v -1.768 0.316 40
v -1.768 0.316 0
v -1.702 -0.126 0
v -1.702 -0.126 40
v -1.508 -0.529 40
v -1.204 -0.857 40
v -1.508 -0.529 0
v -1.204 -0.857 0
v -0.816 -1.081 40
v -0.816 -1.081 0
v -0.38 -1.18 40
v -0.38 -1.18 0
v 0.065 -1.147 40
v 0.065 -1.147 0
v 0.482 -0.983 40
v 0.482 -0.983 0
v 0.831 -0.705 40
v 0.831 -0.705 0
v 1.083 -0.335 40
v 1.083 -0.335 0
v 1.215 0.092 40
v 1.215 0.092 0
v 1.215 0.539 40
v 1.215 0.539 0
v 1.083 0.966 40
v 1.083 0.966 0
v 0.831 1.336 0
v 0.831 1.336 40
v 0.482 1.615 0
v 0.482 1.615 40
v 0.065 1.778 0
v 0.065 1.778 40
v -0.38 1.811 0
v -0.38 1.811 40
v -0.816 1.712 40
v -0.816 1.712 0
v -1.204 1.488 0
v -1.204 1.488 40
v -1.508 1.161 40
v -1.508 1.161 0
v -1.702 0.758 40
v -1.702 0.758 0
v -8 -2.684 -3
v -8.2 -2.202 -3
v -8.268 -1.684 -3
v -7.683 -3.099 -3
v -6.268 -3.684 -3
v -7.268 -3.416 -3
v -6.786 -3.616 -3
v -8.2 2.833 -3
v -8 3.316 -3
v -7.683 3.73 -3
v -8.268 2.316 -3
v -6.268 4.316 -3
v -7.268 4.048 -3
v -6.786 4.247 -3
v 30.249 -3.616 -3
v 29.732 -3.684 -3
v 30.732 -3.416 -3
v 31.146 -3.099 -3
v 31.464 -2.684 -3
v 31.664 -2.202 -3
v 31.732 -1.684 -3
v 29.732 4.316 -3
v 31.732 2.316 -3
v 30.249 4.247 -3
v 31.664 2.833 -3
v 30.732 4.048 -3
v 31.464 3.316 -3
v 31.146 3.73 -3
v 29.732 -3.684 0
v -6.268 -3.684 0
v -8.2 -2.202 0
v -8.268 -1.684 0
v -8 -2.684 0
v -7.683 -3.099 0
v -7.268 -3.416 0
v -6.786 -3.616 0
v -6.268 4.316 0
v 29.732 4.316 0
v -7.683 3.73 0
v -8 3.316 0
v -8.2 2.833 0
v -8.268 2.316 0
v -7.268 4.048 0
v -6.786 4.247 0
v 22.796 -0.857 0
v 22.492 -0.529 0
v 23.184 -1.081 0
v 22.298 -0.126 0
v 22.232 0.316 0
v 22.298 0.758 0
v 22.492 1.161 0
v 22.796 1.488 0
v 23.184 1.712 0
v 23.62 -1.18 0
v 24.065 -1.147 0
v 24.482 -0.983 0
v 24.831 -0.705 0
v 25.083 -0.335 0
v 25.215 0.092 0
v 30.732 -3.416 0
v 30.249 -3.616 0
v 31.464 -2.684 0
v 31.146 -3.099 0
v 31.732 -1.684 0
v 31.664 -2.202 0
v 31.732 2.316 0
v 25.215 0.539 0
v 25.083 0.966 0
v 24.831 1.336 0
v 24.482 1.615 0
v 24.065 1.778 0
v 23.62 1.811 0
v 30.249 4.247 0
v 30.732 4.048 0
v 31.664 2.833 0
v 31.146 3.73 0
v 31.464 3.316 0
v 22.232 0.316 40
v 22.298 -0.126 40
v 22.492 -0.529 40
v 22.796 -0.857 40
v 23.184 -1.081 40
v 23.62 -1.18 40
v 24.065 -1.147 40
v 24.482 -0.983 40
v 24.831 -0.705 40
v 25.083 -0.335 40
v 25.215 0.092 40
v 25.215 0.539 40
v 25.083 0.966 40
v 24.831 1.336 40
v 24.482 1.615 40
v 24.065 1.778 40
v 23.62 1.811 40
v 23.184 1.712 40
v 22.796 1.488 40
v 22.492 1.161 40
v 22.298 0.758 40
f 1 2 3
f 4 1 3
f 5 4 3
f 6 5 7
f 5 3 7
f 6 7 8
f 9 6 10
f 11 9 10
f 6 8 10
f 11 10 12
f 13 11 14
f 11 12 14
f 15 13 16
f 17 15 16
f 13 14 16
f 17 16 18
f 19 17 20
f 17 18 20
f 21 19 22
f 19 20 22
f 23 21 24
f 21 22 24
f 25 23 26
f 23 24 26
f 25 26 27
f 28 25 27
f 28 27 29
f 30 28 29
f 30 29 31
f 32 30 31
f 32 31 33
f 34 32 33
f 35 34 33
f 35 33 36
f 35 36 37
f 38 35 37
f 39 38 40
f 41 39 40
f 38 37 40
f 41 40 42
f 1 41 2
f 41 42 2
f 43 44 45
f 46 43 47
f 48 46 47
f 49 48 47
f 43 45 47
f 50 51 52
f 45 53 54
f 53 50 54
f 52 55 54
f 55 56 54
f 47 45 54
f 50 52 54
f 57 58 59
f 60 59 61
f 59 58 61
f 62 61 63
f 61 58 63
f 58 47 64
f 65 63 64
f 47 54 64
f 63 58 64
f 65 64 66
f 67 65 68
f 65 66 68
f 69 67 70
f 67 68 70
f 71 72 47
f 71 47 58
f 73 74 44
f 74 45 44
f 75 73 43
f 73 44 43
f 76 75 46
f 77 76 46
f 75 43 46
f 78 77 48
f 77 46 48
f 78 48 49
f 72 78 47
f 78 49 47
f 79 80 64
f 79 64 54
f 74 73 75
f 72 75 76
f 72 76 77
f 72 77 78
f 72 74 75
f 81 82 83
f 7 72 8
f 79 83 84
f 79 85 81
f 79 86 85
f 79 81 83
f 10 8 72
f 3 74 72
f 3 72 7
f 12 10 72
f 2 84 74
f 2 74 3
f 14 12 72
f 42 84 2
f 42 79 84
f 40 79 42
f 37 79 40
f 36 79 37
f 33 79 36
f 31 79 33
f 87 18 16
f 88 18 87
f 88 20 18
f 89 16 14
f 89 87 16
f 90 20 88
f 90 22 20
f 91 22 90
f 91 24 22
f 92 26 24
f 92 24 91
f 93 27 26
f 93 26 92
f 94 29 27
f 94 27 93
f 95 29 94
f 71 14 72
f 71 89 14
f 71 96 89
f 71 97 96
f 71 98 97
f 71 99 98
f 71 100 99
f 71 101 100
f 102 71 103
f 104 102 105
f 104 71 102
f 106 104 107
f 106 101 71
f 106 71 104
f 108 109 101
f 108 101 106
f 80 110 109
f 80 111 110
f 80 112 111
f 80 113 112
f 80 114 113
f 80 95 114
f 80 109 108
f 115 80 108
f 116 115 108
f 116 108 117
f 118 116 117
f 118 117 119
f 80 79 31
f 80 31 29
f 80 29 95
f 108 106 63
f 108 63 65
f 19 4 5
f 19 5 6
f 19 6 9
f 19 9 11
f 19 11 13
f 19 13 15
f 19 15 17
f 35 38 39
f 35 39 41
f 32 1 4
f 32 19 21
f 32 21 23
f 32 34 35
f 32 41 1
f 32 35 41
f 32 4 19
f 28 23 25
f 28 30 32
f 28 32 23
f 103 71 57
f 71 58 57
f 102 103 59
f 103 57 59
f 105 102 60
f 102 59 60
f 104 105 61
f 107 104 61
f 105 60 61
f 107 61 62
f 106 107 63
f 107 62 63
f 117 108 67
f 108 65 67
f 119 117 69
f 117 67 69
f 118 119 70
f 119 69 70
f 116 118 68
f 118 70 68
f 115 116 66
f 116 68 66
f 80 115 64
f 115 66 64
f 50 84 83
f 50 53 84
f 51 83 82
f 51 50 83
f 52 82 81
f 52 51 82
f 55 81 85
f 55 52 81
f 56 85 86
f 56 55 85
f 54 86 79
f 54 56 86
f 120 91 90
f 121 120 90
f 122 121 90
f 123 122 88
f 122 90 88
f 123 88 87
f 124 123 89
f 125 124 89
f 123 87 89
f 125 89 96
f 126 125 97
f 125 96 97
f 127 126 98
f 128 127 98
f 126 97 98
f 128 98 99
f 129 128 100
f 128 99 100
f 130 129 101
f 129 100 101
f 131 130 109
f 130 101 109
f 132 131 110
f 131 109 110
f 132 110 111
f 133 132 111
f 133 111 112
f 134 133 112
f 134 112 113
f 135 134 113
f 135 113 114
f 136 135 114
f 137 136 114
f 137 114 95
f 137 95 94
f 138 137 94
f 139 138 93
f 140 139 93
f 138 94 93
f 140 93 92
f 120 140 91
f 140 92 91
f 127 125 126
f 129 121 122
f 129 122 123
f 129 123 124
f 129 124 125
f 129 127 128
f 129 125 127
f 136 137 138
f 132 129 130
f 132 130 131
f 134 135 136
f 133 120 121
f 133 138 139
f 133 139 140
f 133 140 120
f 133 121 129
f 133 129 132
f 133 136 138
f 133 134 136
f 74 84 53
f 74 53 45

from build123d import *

# Parameters (mm, degrees)
F1_DEPTH = 3
F2_R     = 2
F3_DEPTH = 40


with BuildPart() as f1:
    # F0 (on Top) → F1 (new body)
    with BuildSketch(Plane.XY):
        with BuildLine():
            Line((11.7317076979, 4.315632835), (-8.2682923021, 4.315632835))
            Line((-8.2682923021, 4.315632835), (-8.2682923021, 0.315632835))
            Line((-8.2682923021, 0.315632835), (-1.7682923021, 0.315632835))
            ThreePointArc((-1.7682923021, 0.315632835), (-0.2682923021, 1.815632835), (1.2317076979, 0.315632835))
            Line((1.2317076979, 0.315632835), (11.7317076979, 0.315632835))
            Line((11.7317076979, 0.315632835), (11.7317076979, 4.315632835))
        make_face()
        with BuildLine():
            Line((31.7317076979, 4.315632835), (11.7317076979, 4.315632835))
            Line((11.7317076979, 4.315632835), (11.7317076979, 0.315632835))
            Line((11.7317076979, 0.315632835), (22.2317076979, 0.315632835))
            ThreePointArc((22.2317076979, 0.315632835), (23.7317076979, 1.815632835), (25.2317076979, 0.315632835))
            Line((25.2317076979, 0.315632835), (31.7317076979, 0.315632835))
            Line((31.7317076979, 0.315632835), (31.7317076979, 4.315632835))
        make_face()
        with BuildLine():
            Line((-1.7682923021, 0.315632835), (-8.2682923021, 0.315632835))
            Line((-8.2682923021, 0.315632835), (-8.2682923021, -3.684367165))
            Line((-8.2682923021, -3.684367165), (11.7317076979, -3.684367165))
            Line((11.7317076979, -3.684367165), (11.7317076979, 0.315632835))
            Line((11.7317076979, 0.315632835), (1.2317076979, 0.315632835))
            ThreePointArc((1.2317076979, 0.315632835), (-0.2682923021, -1.184367165), (-1.7682923021, 0.315632835))
        make_face()
        with BuildLine():
            Line((22.2317076979, 0.315632835), (11.7317076979, 0.315632835))
            Line((11.7317076979, 0.315632835), (11.7317076979, -3.684367165))
            Line((11.7317076979, -3.684367165), (31.7317076979, -3.684367165))
            Line((31.7317076979, -3.684367165), (31.7317076979, 0.315632835))
            Line((31.7317076979, 0.315632835), (25.2317076979, 0.315632835))
            ThreePointArc((25.2317076979, 0.315632835), (23.7317076979, -1.184367165), (22.2317076979, 0.315632835))
        make_face()
        with BuildLine():
            Line((1.2317076979, 0.315632835), (-1.7682923021, 0.315632835))
            ThreePointArc((-1.7682923021, 0.315632835), (-0.2682923021, -1.184367165), (1.2317076979, 0.315632835))
        make_face()
        with BuildLine():
            ThreePointArc((1.2317076979, 0.315632835), (-0.2682923021, 1.815632835), (-1.7682923021, 0.315632835))
            Line((-1.7682923021, 0.315632835), (1.2317076979, 0.315632835))
        make_face()
        with BuildLine():
            ThreePointArc((25.2317076979, 0.315632835), (23.7317076979, 1.815632835), (22.2317076979, 0.315632835))
            Line((22.2317076979, 0.315632835), (25.2317076979, 0.315632835))
        make_face()
        with BuildLine():
            Line((25.2317076979, 0.315632835), (22.2317076979, 0.315632835))
            ThreePointArc((22.2317076979, 0.315632835), (23.7317076979, -1.184367165), (25.2317076979, 0.315632835))
        make_face()
    extrude(amount=-F1_DEPTH)

    # F2
    f2_edges = [f1.edges().sort_by_distance(p)[0] for p in [
        (-8.268292, -3.684367, -1.5),
        (-8.268292, 4.315633, -1.5),
        (31.731708, -3.684367, -1.5),
        (31.731708, 4.315633, -1.5),
    ]]
    fillet(f2_edges, radius=F2_R)

    # F0 (on Top) → F3 (join)
    with BuildSketch(Plane.XY):
        with BuildLine():
            ThreePointArc((1.2317076979, 0.315632835), (-0.2682923021, 1.815632835), (-1.7682923021, 0.315632835))
            Line((-1.7682923021, 0.315632835), (1.2317076979, 0.315632835))
        make_face()
        with BuildLine():
            Line((1.2317076979, 0.315632835), (-1.7682923021, 0.315632835))
            ThreePointArc((-1.7682923021, 0.315632835), (-0.2682923021, -1.184367165), (1.2317076979, 0.315632835))
        make_face()
        with BuildLine():
            ThreePointArc((25.2317076979, 0.315632835), (23.7317076979, 1.815632835), (22.2317076979, 0.315632835))
            Line((22.2317076979, 0.315632835), (25.2317076979, 0.315632835))
        make_face()
        with BuildLine():
            Line((25.2317076979, 0.315632835), (22.2317076979, 0.315632835))
            ThreePointArc((22.2317076979, 0.315632835), (23.7317076979, -1.184367165), (25.2317076979, 0.315632835))
        make_face()
    extrude(amount=F3_DEPTH)


solid = f1.part
